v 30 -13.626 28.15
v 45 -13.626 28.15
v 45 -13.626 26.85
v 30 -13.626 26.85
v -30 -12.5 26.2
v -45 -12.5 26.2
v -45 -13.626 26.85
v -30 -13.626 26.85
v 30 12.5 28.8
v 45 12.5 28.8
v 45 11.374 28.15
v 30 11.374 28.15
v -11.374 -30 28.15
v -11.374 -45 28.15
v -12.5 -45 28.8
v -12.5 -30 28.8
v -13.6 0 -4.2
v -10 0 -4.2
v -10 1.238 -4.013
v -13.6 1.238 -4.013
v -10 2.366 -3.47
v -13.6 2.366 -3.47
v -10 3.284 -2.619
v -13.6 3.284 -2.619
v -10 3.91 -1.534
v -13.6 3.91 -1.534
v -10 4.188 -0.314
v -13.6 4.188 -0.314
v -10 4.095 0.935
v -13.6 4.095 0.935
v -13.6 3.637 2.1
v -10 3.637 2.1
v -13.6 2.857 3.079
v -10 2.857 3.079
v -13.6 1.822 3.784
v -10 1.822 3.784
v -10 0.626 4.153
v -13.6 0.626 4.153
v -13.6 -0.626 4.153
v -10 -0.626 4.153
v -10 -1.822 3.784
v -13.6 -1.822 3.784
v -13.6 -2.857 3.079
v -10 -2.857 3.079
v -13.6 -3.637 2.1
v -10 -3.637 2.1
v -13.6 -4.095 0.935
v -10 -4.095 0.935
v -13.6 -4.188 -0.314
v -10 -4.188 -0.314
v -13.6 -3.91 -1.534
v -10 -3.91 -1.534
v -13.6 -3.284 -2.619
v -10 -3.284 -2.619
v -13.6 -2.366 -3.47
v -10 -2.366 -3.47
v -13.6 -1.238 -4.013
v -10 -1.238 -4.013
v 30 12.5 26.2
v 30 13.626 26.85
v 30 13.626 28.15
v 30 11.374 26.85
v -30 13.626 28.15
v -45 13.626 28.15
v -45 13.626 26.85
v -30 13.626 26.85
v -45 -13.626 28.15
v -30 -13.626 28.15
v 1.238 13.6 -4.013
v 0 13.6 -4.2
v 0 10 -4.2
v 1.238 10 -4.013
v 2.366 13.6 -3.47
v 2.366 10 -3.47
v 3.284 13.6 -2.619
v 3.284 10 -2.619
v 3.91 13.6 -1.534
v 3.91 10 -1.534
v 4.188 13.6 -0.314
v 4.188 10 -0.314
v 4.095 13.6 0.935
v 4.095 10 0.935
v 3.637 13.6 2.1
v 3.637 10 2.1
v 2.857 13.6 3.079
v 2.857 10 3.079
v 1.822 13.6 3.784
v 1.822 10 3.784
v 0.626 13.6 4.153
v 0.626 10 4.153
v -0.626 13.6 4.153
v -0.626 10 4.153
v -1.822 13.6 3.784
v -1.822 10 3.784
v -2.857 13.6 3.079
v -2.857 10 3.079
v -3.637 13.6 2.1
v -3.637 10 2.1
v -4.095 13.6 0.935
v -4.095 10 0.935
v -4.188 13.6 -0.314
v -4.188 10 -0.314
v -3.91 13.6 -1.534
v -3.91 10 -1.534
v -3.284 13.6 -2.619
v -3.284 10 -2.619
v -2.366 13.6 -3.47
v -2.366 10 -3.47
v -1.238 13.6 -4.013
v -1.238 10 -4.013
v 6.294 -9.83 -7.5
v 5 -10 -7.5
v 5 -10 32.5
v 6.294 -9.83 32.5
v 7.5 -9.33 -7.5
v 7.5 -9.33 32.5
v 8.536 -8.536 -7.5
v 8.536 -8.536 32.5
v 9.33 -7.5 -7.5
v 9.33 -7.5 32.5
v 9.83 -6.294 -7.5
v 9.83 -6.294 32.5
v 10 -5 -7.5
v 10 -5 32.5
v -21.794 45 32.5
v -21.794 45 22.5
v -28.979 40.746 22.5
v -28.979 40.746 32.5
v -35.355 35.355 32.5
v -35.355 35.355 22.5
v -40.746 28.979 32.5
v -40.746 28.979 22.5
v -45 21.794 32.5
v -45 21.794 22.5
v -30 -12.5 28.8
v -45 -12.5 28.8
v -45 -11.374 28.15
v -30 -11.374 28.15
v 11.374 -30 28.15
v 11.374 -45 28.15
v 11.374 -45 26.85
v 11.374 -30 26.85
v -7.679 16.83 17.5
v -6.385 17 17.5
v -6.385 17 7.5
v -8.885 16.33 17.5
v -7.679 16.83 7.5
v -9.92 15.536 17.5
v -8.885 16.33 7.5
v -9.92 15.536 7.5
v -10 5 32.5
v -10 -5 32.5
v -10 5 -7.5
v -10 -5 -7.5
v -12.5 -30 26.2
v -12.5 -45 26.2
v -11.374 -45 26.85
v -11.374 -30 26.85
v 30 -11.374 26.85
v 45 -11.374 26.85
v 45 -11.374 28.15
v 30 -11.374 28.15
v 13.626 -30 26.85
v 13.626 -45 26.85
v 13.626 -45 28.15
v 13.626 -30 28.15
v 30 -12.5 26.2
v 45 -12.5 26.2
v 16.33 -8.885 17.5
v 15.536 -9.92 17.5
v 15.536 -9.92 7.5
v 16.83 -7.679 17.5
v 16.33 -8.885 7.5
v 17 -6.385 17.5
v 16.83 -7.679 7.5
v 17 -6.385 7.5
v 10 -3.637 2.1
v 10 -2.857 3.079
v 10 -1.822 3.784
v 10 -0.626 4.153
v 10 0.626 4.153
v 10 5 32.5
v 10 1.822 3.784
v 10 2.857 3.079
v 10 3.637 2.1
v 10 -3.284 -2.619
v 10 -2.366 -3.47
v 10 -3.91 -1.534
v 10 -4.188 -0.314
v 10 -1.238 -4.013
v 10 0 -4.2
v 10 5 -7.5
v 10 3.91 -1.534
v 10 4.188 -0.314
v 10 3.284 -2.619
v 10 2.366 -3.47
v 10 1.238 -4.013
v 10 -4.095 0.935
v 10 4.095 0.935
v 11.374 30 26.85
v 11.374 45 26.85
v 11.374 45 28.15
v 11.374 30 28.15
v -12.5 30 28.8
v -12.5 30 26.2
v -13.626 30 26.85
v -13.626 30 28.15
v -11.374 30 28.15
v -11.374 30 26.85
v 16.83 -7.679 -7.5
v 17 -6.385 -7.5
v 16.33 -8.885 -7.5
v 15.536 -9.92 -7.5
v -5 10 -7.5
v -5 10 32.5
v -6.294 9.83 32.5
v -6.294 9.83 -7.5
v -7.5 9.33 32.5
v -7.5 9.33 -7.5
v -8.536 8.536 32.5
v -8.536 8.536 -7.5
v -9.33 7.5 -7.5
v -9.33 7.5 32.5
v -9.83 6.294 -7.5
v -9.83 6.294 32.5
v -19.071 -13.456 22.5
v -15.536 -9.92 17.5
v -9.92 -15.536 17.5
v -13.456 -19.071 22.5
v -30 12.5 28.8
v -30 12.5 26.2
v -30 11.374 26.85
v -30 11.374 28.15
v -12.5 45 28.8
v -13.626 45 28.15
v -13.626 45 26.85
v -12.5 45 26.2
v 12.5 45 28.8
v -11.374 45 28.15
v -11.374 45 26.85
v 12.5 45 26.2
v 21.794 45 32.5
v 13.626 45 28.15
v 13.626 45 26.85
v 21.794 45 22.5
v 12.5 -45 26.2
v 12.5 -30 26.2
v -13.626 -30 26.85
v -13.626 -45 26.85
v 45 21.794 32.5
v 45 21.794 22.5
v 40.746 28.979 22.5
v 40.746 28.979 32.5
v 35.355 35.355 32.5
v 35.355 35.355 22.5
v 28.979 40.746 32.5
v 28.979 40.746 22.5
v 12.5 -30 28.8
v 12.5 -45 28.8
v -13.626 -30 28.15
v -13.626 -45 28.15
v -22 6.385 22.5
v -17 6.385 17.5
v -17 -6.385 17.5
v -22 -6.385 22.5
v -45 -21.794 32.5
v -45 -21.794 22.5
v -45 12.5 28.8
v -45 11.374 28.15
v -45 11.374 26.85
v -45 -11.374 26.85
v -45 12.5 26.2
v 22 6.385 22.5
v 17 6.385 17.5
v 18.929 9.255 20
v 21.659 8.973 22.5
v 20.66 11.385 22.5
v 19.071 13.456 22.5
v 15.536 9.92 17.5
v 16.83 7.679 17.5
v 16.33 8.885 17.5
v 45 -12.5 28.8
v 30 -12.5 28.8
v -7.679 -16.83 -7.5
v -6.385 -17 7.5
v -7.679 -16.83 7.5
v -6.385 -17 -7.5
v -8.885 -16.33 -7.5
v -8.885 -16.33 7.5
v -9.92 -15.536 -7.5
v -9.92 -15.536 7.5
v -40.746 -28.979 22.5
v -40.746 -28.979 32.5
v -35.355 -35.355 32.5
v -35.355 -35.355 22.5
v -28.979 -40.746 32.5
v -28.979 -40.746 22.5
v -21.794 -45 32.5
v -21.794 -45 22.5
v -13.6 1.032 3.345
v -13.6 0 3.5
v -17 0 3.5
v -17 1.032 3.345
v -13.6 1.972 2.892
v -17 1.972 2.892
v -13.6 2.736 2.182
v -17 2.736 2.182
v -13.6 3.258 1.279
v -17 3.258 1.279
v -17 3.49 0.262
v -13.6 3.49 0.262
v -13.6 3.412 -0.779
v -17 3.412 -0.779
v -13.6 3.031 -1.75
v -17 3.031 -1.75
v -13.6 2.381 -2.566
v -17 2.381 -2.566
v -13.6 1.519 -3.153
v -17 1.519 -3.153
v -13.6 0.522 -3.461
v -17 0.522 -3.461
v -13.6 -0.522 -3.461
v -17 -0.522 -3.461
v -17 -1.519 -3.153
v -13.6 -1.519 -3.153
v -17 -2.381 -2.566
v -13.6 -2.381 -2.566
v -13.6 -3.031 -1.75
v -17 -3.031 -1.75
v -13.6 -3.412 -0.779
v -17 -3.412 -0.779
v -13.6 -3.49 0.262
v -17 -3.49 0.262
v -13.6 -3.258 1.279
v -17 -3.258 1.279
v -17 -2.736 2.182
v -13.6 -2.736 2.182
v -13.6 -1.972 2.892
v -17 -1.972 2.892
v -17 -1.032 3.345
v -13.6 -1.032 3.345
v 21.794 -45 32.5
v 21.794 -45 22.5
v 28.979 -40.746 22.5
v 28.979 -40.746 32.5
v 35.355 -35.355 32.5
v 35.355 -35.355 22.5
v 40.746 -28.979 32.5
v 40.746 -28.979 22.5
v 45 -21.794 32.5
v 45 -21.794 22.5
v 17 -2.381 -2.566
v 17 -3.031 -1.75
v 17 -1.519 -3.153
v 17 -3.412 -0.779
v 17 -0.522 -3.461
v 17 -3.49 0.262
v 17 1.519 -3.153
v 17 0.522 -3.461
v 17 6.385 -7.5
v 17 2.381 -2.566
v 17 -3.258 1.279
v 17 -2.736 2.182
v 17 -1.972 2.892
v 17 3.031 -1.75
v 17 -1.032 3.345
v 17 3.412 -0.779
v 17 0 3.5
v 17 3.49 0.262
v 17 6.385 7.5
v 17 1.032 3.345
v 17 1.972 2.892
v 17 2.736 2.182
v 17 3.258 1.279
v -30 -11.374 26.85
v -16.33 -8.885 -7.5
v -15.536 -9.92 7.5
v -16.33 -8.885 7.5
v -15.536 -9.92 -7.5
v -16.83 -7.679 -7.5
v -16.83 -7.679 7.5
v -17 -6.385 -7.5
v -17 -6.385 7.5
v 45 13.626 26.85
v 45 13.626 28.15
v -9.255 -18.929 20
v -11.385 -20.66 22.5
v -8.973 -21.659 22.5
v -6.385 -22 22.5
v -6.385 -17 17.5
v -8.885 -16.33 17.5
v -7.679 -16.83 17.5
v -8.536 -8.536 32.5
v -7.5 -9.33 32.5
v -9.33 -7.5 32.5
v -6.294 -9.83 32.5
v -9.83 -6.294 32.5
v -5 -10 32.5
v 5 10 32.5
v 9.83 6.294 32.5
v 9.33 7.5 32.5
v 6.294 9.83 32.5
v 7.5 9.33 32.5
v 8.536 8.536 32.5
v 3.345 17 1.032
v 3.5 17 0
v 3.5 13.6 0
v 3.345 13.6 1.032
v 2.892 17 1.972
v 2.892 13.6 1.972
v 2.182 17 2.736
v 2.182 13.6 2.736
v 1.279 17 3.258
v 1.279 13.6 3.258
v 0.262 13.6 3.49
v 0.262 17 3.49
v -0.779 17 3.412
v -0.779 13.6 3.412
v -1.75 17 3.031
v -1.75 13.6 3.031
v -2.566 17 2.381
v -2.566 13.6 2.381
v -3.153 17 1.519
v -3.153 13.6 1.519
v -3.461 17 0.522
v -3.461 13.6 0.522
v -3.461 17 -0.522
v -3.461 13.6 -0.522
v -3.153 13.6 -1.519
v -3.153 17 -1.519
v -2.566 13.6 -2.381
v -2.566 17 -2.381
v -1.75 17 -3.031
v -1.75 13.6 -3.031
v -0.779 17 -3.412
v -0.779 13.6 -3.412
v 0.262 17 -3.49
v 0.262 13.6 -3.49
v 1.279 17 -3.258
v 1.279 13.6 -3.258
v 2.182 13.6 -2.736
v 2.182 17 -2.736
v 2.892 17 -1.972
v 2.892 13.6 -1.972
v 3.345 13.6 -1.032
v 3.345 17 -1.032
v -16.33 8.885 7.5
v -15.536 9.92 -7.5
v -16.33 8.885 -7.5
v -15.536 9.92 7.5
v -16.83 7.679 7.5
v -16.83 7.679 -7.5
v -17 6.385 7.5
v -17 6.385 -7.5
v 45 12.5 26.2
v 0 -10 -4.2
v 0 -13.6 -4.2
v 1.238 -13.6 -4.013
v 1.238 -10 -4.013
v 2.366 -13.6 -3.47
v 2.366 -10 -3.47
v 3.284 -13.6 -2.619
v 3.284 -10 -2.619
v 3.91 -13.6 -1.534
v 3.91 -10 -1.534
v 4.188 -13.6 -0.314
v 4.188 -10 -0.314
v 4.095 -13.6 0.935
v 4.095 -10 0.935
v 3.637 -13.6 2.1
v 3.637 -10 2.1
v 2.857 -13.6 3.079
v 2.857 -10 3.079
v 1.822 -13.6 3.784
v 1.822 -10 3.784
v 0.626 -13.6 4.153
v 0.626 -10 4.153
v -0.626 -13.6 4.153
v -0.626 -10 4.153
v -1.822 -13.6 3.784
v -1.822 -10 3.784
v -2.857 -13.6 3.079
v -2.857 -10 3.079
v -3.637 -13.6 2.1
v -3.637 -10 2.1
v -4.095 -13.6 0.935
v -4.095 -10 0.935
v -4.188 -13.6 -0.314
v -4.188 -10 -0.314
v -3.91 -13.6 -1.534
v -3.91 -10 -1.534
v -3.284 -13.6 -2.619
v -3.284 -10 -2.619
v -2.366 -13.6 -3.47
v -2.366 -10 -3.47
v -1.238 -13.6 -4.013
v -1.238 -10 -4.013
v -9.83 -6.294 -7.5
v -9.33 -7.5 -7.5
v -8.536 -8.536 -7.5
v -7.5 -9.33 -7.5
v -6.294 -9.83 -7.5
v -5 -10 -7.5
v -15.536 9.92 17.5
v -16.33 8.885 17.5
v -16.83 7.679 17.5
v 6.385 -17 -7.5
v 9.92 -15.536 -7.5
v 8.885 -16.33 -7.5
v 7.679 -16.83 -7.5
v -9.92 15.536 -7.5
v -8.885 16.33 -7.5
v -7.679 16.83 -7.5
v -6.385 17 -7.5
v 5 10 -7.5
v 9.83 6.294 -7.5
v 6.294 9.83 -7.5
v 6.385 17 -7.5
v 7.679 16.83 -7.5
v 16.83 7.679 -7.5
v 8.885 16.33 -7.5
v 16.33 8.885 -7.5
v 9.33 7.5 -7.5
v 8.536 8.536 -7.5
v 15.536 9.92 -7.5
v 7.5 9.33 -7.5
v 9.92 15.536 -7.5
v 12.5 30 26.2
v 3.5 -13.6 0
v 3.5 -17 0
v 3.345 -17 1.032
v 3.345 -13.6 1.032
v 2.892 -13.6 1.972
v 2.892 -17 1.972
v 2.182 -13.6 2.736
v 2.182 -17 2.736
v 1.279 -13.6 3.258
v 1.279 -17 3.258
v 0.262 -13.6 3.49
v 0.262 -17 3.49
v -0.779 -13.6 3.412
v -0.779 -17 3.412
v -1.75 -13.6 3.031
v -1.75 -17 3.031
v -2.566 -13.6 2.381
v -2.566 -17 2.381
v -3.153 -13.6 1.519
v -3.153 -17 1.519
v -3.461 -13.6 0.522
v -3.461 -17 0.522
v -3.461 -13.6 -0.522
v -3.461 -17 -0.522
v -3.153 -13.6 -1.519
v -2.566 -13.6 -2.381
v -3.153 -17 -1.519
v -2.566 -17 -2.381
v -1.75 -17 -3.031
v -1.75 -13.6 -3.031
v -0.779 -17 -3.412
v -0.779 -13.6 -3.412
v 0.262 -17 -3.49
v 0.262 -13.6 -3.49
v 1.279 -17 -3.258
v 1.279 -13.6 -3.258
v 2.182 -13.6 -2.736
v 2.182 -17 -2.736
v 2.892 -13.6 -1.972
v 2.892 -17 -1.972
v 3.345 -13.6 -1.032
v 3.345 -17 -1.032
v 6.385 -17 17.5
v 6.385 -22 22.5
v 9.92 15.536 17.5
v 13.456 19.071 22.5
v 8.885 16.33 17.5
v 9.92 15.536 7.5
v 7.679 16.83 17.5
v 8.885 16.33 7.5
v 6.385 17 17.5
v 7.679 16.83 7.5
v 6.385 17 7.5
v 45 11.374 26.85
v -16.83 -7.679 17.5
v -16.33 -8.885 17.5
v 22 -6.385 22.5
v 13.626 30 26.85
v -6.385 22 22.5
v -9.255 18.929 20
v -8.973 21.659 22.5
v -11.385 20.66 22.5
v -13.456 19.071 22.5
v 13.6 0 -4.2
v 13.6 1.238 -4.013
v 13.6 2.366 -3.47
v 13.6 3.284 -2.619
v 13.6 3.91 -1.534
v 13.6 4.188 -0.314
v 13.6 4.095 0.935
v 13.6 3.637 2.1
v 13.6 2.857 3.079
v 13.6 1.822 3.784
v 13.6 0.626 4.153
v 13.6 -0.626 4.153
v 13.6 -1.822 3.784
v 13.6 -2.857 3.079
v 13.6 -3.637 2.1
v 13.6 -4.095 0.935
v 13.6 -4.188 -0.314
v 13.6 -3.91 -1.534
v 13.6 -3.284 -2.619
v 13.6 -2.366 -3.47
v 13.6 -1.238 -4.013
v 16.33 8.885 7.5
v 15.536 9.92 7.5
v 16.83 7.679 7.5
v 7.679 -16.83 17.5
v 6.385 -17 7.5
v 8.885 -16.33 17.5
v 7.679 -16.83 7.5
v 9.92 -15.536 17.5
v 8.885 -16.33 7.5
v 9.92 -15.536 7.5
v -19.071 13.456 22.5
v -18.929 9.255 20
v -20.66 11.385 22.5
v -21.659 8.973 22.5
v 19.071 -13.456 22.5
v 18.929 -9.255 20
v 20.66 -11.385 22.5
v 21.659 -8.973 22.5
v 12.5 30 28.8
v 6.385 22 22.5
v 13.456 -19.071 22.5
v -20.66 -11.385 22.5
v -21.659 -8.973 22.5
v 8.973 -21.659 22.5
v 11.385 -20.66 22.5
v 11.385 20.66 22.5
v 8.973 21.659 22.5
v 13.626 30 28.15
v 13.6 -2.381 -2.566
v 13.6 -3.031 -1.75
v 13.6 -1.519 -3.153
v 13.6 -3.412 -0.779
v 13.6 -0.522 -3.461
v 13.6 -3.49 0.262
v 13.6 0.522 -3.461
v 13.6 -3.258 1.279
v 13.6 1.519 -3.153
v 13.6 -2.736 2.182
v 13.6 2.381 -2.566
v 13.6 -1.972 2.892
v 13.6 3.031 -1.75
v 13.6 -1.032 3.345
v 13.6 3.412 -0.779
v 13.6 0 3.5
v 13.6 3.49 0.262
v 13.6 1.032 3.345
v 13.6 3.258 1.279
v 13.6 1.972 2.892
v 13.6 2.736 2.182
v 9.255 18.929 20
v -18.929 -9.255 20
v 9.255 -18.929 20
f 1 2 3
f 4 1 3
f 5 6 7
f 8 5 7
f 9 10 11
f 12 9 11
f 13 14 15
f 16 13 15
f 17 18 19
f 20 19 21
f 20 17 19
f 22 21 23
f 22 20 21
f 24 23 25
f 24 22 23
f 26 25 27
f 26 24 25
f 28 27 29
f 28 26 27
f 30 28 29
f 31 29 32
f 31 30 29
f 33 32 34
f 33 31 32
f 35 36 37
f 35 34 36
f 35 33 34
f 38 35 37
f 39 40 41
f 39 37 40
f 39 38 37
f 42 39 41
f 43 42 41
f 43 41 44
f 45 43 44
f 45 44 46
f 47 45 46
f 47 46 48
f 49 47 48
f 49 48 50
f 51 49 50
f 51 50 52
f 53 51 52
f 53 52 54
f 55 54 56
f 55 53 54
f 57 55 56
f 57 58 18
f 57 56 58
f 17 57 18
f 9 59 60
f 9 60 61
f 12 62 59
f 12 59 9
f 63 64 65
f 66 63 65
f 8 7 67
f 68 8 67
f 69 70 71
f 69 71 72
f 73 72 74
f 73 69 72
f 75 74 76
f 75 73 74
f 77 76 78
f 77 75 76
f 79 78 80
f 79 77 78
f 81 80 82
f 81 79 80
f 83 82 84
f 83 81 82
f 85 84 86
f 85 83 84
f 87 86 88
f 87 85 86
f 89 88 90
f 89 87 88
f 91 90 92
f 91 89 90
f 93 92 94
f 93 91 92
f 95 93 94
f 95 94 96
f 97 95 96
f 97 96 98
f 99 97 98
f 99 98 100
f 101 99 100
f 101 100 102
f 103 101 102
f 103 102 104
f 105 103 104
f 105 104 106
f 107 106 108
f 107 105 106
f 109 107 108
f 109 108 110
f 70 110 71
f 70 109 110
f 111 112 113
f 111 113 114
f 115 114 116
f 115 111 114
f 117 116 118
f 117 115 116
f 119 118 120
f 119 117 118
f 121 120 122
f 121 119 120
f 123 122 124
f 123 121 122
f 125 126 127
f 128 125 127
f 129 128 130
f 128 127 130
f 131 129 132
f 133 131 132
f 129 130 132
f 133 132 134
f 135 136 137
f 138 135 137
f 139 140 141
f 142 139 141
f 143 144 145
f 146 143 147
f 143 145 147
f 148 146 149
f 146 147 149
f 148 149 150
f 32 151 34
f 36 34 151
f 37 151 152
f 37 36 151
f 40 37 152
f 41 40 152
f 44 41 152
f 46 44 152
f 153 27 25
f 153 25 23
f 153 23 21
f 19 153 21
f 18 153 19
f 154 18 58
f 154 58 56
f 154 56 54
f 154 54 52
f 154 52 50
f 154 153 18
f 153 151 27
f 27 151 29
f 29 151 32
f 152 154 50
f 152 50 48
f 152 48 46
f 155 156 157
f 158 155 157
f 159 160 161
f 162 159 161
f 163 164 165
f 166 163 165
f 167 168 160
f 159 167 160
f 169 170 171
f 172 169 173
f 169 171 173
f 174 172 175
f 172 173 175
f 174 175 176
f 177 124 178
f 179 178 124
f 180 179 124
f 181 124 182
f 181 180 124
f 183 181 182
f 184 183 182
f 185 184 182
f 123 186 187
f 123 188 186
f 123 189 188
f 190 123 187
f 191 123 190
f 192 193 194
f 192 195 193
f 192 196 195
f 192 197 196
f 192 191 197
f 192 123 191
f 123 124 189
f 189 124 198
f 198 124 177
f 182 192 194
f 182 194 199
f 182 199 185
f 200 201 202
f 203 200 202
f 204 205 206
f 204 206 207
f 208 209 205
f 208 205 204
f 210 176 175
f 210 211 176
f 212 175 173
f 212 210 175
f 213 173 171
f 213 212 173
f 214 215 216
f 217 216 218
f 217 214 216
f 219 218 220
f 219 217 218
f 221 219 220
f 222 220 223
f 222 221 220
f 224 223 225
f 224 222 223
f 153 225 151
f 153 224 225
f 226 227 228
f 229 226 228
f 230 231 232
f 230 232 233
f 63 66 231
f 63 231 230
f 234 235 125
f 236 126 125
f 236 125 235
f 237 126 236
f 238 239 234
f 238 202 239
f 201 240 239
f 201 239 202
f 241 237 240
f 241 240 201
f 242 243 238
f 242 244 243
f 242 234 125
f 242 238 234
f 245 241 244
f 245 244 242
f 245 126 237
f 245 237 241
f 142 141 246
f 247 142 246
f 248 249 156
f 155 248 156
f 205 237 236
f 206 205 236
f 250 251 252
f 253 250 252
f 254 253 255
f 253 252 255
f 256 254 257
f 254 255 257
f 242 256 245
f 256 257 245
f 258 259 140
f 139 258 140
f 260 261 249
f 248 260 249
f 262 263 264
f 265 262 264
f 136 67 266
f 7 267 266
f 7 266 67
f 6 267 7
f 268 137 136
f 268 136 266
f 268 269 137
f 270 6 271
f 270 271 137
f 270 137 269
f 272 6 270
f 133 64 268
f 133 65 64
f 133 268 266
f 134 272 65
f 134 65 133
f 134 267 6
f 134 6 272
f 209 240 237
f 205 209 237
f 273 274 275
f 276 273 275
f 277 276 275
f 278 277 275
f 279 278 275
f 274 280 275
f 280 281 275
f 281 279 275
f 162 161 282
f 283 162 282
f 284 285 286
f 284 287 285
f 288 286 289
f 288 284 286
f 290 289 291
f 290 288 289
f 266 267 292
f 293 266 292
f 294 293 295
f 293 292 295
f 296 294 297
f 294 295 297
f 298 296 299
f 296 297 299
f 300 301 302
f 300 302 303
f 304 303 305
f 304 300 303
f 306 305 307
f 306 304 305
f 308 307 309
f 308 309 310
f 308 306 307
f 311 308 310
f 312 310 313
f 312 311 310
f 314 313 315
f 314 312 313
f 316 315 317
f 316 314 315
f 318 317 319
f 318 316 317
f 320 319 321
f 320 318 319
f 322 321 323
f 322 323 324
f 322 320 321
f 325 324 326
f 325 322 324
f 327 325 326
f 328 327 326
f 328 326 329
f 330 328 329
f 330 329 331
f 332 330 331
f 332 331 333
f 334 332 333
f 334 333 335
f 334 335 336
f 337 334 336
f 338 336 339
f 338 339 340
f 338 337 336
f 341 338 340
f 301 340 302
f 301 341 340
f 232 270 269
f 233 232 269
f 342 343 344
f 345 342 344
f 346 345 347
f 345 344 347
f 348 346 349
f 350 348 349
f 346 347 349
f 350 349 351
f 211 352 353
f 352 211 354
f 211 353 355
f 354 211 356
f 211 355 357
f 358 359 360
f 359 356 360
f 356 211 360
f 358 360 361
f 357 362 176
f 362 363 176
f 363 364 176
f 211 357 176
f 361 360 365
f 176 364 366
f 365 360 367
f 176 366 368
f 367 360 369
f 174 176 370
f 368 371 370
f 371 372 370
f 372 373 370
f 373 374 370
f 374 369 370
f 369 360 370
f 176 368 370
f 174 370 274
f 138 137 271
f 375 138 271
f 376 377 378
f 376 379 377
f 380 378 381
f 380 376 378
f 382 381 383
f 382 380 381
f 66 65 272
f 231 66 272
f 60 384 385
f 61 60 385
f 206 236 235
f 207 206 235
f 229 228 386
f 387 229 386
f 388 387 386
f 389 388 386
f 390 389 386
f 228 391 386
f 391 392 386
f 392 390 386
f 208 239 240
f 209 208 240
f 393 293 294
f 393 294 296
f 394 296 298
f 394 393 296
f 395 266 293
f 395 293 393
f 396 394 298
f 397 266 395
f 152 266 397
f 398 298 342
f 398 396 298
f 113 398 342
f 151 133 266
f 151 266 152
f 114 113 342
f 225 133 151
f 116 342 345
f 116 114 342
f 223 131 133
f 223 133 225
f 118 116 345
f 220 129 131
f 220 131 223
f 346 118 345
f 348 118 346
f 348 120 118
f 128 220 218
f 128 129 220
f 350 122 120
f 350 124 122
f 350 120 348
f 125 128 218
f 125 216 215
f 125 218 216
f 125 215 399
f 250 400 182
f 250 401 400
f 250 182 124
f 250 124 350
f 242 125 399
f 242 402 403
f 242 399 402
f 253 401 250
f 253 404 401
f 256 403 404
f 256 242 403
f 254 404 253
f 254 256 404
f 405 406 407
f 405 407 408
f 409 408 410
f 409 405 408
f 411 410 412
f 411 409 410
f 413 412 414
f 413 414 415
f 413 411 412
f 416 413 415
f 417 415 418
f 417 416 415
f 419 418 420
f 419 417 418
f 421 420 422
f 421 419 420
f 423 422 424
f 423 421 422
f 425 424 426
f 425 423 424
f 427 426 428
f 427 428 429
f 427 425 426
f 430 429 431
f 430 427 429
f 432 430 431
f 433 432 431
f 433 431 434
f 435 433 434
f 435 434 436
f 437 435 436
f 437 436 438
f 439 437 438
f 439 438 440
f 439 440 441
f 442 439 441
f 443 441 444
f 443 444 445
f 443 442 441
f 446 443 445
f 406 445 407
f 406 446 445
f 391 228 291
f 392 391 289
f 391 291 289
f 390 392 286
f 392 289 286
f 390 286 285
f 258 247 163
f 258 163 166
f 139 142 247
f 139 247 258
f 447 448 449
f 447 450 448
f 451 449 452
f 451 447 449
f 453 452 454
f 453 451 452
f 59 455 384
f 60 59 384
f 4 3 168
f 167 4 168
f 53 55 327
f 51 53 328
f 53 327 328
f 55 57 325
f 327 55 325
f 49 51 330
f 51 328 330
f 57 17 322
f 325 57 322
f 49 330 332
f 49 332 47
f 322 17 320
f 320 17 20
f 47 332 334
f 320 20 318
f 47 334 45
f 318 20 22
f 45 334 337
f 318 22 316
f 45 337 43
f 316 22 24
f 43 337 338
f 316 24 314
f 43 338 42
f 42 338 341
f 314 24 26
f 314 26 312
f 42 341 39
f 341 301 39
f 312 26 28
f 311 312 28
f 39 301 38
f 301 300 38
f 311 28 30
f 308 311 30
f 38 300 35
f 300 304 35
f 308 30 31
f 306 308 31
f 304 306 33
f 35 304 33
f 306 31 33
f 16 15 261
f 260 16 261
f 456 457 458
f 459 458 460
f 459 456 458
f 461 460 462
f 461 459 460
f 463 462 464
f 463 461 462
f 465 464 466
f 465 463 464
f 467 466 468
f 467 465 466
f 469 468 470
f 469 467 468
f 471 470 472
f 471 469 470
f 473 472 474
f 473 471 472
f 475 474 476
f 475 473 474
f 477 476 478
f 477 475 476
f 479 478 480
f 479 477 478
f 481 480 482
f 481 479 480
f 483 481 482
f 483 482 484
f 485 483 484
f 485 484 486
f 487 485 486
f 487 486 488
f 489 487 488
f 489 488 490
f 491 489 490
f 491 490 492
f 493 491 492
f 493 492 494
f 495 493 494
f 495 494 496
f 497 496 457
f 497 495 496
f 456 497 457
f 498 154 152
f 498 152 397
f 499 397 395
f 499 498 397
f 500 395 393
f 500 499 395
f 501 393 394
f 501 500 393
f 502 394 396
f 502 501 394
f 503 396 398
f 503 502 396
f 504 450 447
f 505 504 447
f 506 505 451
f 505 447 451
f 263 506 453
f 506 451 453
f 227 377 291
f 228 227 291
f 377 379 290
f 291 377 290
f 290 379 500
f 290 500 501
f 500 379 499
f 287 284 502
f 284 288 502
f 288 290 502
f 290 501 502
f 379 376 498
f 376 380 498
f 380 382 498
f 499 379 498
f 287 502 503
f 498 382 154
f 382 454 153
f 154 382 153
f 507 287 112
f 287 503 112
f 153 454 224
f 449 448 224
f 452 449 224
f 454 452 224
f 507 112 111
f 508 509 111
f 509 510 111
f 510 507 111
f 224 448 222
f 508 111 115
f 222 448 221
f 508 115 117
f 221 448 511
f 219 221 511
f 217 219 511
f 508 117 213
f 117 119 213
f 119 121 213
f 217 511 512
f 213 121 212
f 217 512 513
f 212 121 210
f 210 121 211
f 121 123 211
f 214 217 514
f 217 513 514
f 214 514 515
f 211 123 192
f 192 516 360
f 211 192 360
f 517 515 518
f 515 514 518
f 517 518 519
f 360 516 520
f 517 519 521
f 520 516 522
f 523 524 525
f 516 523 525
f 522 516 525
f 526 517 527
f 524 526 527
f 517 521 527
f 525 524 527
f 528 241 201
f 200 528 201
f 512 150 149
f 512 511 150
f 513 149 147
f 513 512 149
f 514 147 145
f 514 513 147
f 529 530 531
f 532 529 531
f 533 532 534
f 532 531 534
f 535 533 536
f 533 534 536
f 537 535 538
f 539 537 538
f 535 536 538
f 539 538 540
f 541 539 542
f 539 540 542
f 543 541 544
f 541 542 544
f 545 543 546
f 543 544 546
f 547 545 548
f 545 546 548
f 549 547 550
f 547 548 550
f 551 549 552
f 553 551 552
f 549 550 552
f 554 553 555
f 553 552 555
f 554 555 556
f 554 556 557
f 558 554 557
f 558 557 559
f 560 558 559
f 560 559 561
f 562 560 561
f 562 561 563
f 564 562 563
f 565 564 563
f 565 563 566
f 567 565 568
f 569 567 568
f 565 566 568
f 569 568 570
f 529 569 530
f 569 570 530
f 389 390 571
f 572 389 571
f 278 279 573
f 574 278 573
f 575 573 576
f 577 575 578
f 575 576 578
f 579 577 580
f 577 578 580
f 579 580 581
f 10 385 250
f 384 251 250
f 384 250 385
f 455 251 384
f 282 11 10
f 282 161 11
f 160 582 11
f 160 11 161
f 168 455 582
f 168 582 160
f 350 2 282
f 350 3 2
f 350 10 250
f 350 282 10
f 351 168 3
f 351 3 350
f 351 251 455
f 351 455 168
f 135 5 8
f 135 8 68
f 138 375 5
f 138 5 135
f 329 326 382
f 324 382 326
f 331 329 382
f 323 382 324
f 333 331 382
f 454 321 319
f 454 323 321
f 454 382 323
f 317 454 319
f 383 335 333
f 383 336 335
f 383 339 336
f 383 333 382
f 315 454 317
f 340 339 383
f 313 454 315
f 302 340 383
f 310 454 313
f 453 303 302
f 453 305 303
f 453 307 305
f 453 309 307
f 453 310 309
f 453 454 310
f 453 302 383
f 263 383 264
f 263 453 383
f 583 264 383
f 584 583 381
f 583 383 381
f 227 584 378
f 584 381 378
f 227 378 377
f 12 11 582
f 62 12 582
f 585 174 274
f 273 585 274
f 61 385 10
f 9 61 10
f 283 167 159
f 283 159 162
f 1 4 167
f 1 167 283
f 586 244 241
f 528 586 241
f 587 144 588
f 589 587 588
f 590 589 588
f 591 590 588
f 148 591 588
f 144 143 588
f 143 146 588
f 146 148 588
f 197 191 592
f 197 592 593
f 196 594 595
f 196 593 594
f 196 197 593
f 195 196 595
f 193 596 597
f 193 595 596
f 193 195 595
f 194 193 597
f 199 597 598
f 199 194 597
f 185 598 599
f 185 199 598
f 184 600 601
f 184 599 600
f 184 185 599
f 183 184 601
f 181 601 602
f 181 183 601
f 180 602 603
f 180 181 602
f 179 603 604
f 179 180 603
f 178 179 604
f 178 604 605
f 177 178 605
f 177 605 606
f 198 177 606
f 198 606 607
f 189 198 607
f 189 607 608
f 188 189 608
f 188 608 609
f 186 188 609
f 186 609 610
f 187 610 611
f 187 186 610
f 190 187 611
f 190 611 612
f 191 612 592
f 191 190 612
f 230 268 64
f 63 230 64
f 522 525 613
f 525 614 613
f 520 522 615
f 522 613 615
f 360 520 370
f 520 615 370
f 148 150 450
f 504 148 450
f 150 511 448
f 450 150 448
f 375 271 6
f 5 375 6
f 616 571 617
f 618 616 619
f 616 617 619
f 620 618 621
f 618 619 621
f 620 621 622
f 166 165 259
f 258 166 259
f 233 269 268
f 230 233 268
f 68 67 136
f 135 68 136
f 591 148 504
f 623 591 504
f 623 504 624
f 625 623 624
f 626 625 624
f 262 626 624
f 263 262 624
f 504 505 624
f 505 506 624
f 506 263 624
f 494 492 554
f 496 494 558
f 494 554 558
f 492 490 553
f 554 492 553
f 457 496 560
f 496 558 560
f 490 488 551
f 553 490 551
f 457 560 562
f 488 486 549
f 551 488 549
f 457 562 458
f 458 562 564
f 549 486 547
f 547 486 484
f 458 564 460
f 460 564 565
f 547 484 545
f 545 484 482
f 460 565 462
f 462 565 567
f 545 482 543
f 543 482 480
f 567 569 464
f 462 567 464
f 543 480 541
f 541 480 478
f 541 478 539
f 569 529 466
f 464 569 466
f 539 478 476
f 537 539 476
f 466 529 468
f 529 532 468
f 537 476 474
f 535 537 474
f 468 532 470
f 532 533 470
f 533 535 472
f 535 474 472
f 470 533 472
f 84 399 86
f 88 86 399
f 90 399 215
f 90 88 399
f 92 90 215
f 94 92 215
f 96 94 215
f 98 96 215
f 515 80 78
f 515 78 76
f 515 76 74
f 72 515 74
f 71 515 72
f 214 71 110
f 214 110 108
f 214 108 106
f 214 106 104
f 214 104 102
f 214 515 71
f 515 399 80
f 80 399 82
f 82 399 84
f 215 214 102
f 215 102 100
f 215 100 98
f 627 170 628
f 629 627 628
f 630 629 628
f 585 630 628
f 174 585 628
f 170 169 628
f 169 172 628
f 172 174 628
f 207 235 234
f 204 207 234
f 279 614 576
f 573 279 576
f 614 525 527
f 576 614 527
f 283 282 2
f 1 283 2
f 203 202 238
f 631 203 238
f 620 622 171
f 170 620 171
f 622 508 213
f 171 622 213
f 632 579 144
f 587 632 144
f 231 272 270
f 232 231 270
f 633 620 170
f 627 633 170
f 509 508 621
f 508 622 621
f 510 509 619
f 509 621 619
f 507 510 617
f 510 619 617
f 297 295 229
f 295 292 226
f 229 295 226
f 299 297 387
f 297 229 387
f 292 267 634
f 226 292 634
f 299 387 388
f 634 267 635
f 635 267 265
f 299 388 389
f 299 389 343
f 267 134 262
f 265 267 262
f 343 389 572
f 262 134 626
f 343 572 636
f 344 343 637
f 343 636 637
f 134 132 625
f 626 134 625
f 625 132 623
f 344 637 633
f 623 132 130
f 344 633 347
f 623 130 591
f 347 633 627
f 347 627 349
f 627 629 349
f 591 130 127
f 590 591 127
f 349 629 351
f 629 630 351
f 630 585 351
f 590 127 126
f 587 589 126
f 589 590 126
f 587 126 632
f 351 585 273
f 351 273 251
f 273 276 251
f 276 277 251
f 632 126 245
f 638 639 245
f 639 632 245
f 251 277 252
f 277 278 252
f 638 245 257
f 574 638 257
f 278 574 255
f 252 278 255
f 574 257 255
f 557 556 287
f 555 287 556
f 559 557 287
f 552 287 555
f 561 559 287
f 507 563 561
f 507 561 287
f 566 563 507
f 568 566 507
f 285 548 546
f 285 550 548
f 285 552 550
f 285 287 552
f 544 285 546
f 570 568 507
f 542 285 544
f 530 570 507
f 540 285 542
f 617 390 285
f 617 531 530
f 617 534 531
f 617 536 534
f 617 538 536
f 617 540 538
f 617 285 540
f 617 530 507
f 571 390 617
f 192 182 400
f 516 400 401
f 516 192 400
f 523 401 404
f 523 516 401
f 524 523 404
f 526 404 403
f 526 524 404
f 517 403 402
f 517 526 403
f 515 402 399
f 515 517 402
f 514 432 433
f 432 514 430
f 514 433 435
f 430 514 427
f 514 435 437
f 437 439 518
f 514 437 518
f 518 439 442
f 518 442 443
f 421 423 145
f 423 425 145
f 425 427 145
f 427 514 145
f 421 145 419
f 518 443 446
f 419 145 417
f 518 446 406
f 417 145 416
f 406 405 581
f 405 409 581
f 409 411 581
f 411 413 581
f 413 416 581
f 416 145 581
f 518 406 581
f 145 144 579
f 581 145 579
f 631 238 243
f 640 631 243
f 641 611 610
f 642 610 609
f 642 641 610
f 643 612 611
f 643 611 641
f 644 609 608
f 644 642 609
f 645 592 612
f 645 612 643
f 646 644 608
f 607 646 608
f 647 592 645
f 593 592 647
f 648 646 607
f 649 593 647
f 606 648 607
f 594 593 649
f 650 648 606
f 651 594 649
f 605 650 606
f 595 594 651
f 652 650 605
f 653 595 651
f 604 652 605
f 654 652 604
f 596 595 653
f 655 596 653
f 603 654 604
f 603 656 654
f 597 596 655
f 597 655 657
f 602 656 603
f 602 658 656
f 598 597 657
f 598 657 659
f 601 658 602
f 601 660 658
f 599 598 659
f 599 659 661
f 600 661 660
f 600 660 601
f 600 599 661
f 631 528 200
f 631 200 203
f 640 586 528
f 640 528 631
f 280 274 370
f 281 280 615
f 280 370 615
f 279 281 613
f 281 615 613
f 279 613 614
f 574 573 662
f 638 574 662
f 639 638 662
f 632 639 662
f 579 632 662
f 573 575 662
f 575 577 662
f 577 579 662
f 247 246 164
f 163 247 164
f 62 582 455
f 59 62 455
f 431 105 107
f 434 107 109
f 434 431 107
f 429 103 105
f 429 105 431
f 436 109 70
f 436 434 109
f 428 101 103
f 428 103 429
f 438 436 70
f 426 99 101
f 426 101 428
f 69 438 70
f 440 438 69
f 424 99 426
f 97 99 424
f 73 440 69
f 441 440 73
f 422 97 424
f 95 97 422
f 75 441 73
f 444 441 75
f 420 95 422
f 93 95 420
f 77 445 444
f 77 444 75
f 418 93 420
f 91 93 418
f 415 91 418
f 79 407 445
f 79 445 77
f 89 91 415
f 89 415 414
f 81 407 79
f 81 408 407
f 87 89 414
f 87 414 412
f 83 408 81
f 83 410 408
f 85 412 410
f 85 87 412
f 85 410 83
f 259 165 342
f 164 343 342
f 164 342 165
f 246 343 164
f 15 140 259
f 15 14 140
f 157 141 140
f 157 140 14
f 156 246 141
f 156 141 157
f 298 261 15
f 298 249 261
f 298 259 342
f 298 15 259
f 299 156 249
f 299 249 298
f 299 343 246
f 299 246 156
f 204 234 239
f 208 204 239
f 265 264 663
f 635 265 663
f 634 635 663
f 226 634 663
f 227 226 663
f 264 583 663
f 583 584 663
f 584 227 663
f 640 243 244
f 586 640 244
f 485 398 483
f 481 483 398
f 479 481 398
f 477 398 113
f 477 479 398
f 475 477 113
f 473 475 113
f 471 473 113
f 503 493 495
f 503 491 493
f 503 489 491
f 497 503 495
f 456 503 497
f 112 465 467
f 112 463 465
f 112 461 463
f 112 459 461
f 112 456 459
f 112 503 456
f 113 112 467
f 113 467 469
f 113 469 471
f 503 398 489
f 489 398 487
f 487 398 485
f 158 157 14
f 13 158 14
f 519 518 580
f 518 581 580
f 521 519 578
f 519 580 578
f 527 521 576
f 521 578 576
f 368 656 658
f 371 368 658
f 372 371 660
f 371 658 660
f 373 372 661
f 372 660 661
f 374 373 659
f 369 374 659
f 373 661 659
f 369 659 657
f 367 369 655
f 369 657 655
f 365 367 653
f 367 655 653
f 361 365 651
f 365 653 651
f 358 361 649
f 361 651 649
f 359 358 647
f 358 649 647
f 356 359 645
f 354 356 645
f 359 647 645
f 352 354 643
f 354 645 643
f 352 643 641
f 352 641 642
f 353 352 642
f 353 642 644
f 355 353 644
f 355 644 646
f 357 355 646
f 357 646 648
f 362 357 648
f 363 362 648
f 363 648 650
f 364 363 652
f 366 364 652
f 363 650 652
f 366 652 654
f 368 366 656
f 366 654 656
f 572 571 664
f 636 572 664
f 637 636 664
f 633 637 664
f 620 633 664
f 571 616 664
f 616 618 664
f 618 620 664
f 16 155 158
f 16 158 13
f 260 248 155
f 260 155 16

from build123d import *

# Parameters (mm, degrees)
EXTRUDE_1_DEPTH          = 7.5
CUT_EXTRUDE_1_DEPTH      = 30.546573405
CUT_EXTRUDE_1_DEPTH_BACK = 30.546573405
SKETCH_2_W               = 20
SKETCH_2_H               = 20
SKETCH_11_W              = 29.504788154
SKETCH_11_H              = 47.493911142
CUT_EXTRUDE_7_DEPTH      = 1
SKETCH_12_W              = 20.237973212
SKETCH_12_H              = 25.719397838
CUT_EXTRUDE_8_DEPTH      = 1
FILLET_1_R               = 5
FILLET_2_R               = 5
CUT_EXTRUDE_2_DEPTH      = 39.745967532
CUT_EXTRUDE_2_DEPTH_BACK = 39.745967532
SKETCH_3_R               = 4.2
CUT_EXTRUDE_3_DEPTH      = 39.745967532
CUT_EXTRUDE_3_DEPTH_BACK = 39.745967532
SKETCH_4_R               = 4.2
EXTRUDE_2_DEPTH          = 15
SKETCH_6_R               = 4.2
SKETCH_6_R_2             = 3.5
EXTRUDE_3_DEPTH          = 3.4
EXTRUDE_START            = -3.4
SKETCH_13_R              = 4.2
SKETCH_13_R_2            = 3.5
EXTRUDE_4_DEPTH          = 3.4
SKETCH_14_R              = 50
EXTRUDE_5_DEPTH          = 10
CUT_EXTRUDE_START        = -10
CUT_EXTRUDE_9_DEPTH      = 10
CHAMFER_1_SIZE           = 5
CUT_EXTRUDE_10_DEPTH     = 15
PATTERN_CIRCULAR_1_COUNT = 4


with BuildPart() as part:
    # ｽｹｯﾁ1 → ﾎﾞｽ - 押し出し1 (new, symmetric)
    with BuildSketch(Plane.XY):
        Polygon((7.455844123, -18), (18, -7.455844123), (18, 7.455844123), (7.455844123, 18), (-7.455844123, 18), (-18, 7.455844123), (-18, -7.455844123), (-7.455844123, -18), align=None)
    extrude(amount=EXTRUDE_1_DEPTH, both=True)

    # ｽｹｯﾁ2 → ｶｯﾄ - 押し出し1 (cut, two sides: drawn at the far end of the back side and taken through both)
    with BuildSketch(Plane.XY.offset(7.5).offset(-CUT_EXTRUDE_1_DEPTH_BACK)):
        Rectangle(SKETCH_2_W, SKETCH_2_H)
    extrude(amount=CUT_EXTRUDE_1_DEPTH + CUT_EXTRUDE_1_DEPTH_BACK, mode=Mode.SUBTRACT)

    # ｽｹｯﾁ11 → ｶｯﾄ - 押し出し7 (cut)
    with BuildSketch(Plane(origin=(0, 18, 0), x_dir=(1, 0, 0), z_dir=(0, 1, 0))):
        Rectangle(SKETCH_11_W, SKETCH_11_H)
    cut_extrude_7 = extrude(amount=-CUT_EXTRUDE_7_DEPTH, mode=Mode.SUBTRACT)

    # ﾐﾗｰ1: ｶｯﾄ - 押し出し7 across plane
    add(cut_extrude_7.mirror(Plane.ZX), mode=Mode.SUBTRACT)

    # ｽｹｯﾁ12 → ｶｯﾄ - 押し出し8 (cut)
    with BuildSketch(Plane.ZY.offset(18)):
        Rectangle(SKETCH_12_W, SKETCH_12_H)
    cut_extrude_8 = extrude(amount=-CUT_EXTRUDE_8_DEPTH, mode=Mode.SUBTRACT)

    # ﾐﾗｰ2: ｶｯﾄ - 押し出し8 across plane
    add(cut_extrude_8.mirror(Plane(origin=(0, 0, 0), x_dir=(0, 0, 1), z_dir=(1, 0, 0))), mode=Mode.SUBTRACT)

    # ﾌｨﾚｯﾄ1
    fillet_1_edges = [part.edges().sort_by_distance(p)[0] for p in [
        (-10, -10, 0),
        (-10, 10, 0),
        (10, 10, 0),
        (10, -10, 0),
    ]]
    fillet(fillet_1_edges, radius=FILLET_1_R)

    # ﾌｨﾚｯﾄ2
    fillet_2_edges = [part.edges().sort_by_distance(p)[0] for p in [
        (17, 8.455844123, 0),
        (17, -8.455844123, 0),
        (-8.455844123, 17, 0),
        (8.455844123, 17, 0),
        (8.455844123, -17, 0),
        (-8.455844123, -17, 0),
        (-17, -8.455844123, 0),
        (-17, 8.455844123, 0),
    ]]
    fillet(fillet_2_edges, radius=FILLET_2_R)

    # ｽｹｯﾁ3 → ｶｯﾄ - 押し出し2 (cut, two sides: drawn at the far end of the back side and taken through both)
    with BuildSketch(Plane.XZ.offset(17).offset(-CUT_EXTRUDE_2_DEPTH_BACK)):
        with Locations(Location((0, 0, 0), (0, 0, 270))):
            Circle(SKETCH_3_R)
    extrude(amount=CUT_EXTRUDE_2_DEPTH + CUT_EXTRUDE_2_DEPTH_BACK, mode=Mode.SUBTRACT)

    # ｽｹｯﾁ4 → ｶｯﾄ - 押し出し3 (cut, two sides: drawn at the far end of the back side and taken through both)
    with BuildSketch(Plane(origin=(17, 0, 0), x_dir=(0, 0, -1), z_dir=(1, 0, 0)).offset(-CUT_EXTRUDE_3_DEPTH_BACK)):
        Circle(SKETCH_4_R)
    extrude(amount=CUT_EXTRUDE_3_DEPTH + CUT_EXTRUDE_3_DEPTH_BACK, mode=Mode.SUBTRACT)

    # ｽｹｯﾁ5 → ﾎﾞｽ - 押し出し2 (add)
    with BuildSketch(Plane.XY.offset(7.5)):
        with BuildLine():
            Line((17, -6.384776311), (17, 6.384776311))
            ThreePointArc((17, 6.384776311), (16.619397663, 8.298193473), (15.535533906, 9.920310217))
            Line((15.535533906, 9.920310217), (9.920310217, 15.535533906))
            ThreePointArc((9.920310217, 15.535533906), (8.298193473, 16.619397663), (6.384776311, 17))
            Line((6.384776311, 17), (-6.384776311, 17))
            ThreePointArc((-6.384776311, 17), (-8.298193473, 16.619397663), (-9.920310217, 15.535533906))
            Line((-9.920310217, 15.535533906), (-15.535533906, 9.920310217))
            ThreePointArc((-15.535533906, 9.920310217), (-16.619397663, 8.298193473), (-17, 6.384776311))
            Line((-17, 6.384776311), (-17, -6.384776311))
            ThreePointArc((-17, -6.384776311), (-16.619397663, -8.298193473), (-15.535533906, -9.920310217))
            Line((-15.535533906, -9.920310217), (-9.920310217, -15.535533906))
            ThreePointArc((-9.920310217, -15.535533906), (-8.298193473, -16.619397663), (-6.384776311, -17))
            Line((-6.384776311, -17), (6.384776311, -17))
            ThreePointArc((6.384776311, -17), (8.298193473, -16.619397663), (9.920310217, -15.535533906))
            Line((9.920310217, -15.535533906), (15.535533906, -9.920310217))
            ThreePointArc((15.535533906, -9.920310217), (16.619397663, -8.298193473), (17, -6.384776311))
        make_face()
        with BuildLine():
            Line((5, 10), (-5, 10))
            ThreePointArc((-5, 10), (-8.535533906, 8.535533906), (-10, 5))
            Line((-10, 5), (-10, -5))
            ThreePointArc((-10, -5), (-8.535533906, -8.535533906), (-5, -10))
            Line((-5, -10), (5, -10))
            ThreePointArc((5, -10), (8.535533906, -8.535533906), (10, -5))
            Line((10, -5), (10, 5))
            ThreePointArc((10, 5), (8.535533906, 8.535533906), (5, 10))
        make_face(mode=Mode.SUBTRACT)
    extrude(amount=EXTRUDE_2_DEPTH)

    # ｽｹｯﾁ6 → ﾎﾞｽ - 押し出し3 (add)
    with BuildSketch(Plane.XZ.offset(17)):
        Circle(SKETCH_6_R)
        Circle(SKETCH_6_R_2, mode=Mode.SUBTRACT)
    extrude_3 = extrude(amount=-EXTRUDE_3_DEPTH)

    # ﾐﾗｰ3: ﾎﾞｽ - 押し出し3 across plane
    add(extrude_3.mirror(Plane.ZX))

    # ｽｹｯﾁ13 → ﾎﾞｽ - 押し出し4 (add)
    with BuildSketch(Plane.ZY.offset(17).offset(EXTRUDE_START)):
        Circle(SKETCH_13_R)
        Circle(SKETCH_13_R_2, mode=Mode.SUBTRACT)
    extrude_4 = extrude(amount=EXTRUDE_4_DEPTH)

    # ﾐﾗｰ4: ﾎﾞｽ - 押し出し4 across plane
    add(extrude_4.mirror(Plane(origin=(0, 0, 0), x_dir=(0, 0, 1), z_dir=(1, 0, 0))))

    # ｽｹｯﾁ14 → ﾎﾞｽ - 押し出し5 (add)
    with BuildSketch(Plane.XY.offset(22.5)):
        Circle(SKETCH_14_R)
        with BuildLine():
            Line((-5, -10), (5, -10))
            ThreePointArc((5, -10), (8.535533906, -8.535533906), (10, -5))
            Line((10, -5), (10, 5))
            ThreePointArc((10, 5), (8.535533906, 8.535533906), (5, 10))
            Line((5, 10), (-5, 10))
            ThreePointArc((-5, 10), (-8.535533906, 8.535533906), (-10, 5))
            Line((-10, 5), (-10, -5))
            ThreePointArc((-10, -5), (-8.535533906, -8.535533906), (-5, -10))
        make_face(mode=Mode.SUBTRACT)
    extrude(amount=EXTRUDE_5_DEPTH)

    # ｽｹｯﾁ15 → ｶｯﾄ - 押し出し9 (cut)
    with BuildSketch(Plane.XY.offset(32.5).offset(CUT_EXTRUDE_START)):
        with BuildLine():
            ThreePointArc((21.794494718, 45), (0, 50), (-21.794494718, 45))
            Line((-21.794494718, 45), (21.794494718, 45))
        make_face()
        with BuildLine():
            Line((45, 21.794494718), (45, -21.794494718))
            ThreePointArc((45, -21.794494718), (48.733971724, -11.180339887), (50, 0))
            ThreePointArc((50, 0), (48.733971724, 11.180339887), (45, 21.794494718))
        make_face()
        with BuildLine():
            Line((21.794494718, -45), (-21.794494718, -45))
            ThreePointArc((-21.794494718, -45), (0, -50), (21.794494718, -45))
        make_face()
        with BuildLine():
            ThreePointArc((-45, 21.794494718), (-50, 0), (-45, -21.794494718))
            Line((-45, -21.794494718), (-45, 21.794494718))
        make_face()
    extrude(amount=CUT_EXTRUDE_9_DEPTH, mode=Mode.SUBTRACT)

    # 面取り1
    chamfer_1_edges = [part.edges().sort_by_distance(p)[0] for p in [
        (16.619397663, -8.298193473, 22.5),
        (17, 0, 22.5),
        (16.619397663, 8.298193473, 22.5),
        (12.727922061, 12.727922061, 22.5),
        (8.298193473, 16.619397663, 22.5),
        (0, 17, 22.5),
        (-8.298193473, 16.619397663, 22.5),
        (-12.727922061, 12.727922061, 22.5),
        (-16.619397663, 8.298193473, 22.5),
        (-17, 0, 22.5),
        (-16.619397663, -8.298193473, 22.5),
        (-12.727922061, -12.727922061, 22.5),
        (-8.298193473, -16.619397663, 22.5),
        (0, -17, 22.5),
        (8.298193473, -16.619397663, 22.5),
        (12.727922061, -12.727922061, 22.5),
    ]]
    chamfer(chamfer_1_edges, length=CHAMFER_1_SIZE)

    # ｽｹｯﾁ16 → ｶｯﾄ - 押し出し10 (cut)
    with BuildSketch(Plane.ZY.offset(45)):
        Polygon((28.8, 12.5), (28.15, 13.625833025), (26.85, 13.625833025), (26.2, 12.5), (26.85, 11.374166975), (28.15, 11.374166975), align=None)
        Polygon((28.8, -12.5), (28.15, -11.374166975), (26.85, -11.374166975), (26.2, -12.5), (26.85, -13.625833025), (28.15, -13.625833025), align=None)
    cut_extrude_10 = extrude(amount=-CUT_EXTRUDE_10_DEPTH, mode=Mode.SUBTRACT)

    # 円形ﾊﾟﾀｰﾝ1: ｶｯﾄ - 押し出し10 ×4 about axis
    pattern_circular_1_axis = Axis((0, 0, 0), (0, 0, 1))
    for i in range(1, PATTERN_CIRCULAR_1_COUNT):
        add(cut_extrude_10.rotate(pattern_circular_1_axis, i * 360 / PATTERN_CIRCULAR_1_COUNT), mode=Mode.SUBTRACT)


solid = part.part
